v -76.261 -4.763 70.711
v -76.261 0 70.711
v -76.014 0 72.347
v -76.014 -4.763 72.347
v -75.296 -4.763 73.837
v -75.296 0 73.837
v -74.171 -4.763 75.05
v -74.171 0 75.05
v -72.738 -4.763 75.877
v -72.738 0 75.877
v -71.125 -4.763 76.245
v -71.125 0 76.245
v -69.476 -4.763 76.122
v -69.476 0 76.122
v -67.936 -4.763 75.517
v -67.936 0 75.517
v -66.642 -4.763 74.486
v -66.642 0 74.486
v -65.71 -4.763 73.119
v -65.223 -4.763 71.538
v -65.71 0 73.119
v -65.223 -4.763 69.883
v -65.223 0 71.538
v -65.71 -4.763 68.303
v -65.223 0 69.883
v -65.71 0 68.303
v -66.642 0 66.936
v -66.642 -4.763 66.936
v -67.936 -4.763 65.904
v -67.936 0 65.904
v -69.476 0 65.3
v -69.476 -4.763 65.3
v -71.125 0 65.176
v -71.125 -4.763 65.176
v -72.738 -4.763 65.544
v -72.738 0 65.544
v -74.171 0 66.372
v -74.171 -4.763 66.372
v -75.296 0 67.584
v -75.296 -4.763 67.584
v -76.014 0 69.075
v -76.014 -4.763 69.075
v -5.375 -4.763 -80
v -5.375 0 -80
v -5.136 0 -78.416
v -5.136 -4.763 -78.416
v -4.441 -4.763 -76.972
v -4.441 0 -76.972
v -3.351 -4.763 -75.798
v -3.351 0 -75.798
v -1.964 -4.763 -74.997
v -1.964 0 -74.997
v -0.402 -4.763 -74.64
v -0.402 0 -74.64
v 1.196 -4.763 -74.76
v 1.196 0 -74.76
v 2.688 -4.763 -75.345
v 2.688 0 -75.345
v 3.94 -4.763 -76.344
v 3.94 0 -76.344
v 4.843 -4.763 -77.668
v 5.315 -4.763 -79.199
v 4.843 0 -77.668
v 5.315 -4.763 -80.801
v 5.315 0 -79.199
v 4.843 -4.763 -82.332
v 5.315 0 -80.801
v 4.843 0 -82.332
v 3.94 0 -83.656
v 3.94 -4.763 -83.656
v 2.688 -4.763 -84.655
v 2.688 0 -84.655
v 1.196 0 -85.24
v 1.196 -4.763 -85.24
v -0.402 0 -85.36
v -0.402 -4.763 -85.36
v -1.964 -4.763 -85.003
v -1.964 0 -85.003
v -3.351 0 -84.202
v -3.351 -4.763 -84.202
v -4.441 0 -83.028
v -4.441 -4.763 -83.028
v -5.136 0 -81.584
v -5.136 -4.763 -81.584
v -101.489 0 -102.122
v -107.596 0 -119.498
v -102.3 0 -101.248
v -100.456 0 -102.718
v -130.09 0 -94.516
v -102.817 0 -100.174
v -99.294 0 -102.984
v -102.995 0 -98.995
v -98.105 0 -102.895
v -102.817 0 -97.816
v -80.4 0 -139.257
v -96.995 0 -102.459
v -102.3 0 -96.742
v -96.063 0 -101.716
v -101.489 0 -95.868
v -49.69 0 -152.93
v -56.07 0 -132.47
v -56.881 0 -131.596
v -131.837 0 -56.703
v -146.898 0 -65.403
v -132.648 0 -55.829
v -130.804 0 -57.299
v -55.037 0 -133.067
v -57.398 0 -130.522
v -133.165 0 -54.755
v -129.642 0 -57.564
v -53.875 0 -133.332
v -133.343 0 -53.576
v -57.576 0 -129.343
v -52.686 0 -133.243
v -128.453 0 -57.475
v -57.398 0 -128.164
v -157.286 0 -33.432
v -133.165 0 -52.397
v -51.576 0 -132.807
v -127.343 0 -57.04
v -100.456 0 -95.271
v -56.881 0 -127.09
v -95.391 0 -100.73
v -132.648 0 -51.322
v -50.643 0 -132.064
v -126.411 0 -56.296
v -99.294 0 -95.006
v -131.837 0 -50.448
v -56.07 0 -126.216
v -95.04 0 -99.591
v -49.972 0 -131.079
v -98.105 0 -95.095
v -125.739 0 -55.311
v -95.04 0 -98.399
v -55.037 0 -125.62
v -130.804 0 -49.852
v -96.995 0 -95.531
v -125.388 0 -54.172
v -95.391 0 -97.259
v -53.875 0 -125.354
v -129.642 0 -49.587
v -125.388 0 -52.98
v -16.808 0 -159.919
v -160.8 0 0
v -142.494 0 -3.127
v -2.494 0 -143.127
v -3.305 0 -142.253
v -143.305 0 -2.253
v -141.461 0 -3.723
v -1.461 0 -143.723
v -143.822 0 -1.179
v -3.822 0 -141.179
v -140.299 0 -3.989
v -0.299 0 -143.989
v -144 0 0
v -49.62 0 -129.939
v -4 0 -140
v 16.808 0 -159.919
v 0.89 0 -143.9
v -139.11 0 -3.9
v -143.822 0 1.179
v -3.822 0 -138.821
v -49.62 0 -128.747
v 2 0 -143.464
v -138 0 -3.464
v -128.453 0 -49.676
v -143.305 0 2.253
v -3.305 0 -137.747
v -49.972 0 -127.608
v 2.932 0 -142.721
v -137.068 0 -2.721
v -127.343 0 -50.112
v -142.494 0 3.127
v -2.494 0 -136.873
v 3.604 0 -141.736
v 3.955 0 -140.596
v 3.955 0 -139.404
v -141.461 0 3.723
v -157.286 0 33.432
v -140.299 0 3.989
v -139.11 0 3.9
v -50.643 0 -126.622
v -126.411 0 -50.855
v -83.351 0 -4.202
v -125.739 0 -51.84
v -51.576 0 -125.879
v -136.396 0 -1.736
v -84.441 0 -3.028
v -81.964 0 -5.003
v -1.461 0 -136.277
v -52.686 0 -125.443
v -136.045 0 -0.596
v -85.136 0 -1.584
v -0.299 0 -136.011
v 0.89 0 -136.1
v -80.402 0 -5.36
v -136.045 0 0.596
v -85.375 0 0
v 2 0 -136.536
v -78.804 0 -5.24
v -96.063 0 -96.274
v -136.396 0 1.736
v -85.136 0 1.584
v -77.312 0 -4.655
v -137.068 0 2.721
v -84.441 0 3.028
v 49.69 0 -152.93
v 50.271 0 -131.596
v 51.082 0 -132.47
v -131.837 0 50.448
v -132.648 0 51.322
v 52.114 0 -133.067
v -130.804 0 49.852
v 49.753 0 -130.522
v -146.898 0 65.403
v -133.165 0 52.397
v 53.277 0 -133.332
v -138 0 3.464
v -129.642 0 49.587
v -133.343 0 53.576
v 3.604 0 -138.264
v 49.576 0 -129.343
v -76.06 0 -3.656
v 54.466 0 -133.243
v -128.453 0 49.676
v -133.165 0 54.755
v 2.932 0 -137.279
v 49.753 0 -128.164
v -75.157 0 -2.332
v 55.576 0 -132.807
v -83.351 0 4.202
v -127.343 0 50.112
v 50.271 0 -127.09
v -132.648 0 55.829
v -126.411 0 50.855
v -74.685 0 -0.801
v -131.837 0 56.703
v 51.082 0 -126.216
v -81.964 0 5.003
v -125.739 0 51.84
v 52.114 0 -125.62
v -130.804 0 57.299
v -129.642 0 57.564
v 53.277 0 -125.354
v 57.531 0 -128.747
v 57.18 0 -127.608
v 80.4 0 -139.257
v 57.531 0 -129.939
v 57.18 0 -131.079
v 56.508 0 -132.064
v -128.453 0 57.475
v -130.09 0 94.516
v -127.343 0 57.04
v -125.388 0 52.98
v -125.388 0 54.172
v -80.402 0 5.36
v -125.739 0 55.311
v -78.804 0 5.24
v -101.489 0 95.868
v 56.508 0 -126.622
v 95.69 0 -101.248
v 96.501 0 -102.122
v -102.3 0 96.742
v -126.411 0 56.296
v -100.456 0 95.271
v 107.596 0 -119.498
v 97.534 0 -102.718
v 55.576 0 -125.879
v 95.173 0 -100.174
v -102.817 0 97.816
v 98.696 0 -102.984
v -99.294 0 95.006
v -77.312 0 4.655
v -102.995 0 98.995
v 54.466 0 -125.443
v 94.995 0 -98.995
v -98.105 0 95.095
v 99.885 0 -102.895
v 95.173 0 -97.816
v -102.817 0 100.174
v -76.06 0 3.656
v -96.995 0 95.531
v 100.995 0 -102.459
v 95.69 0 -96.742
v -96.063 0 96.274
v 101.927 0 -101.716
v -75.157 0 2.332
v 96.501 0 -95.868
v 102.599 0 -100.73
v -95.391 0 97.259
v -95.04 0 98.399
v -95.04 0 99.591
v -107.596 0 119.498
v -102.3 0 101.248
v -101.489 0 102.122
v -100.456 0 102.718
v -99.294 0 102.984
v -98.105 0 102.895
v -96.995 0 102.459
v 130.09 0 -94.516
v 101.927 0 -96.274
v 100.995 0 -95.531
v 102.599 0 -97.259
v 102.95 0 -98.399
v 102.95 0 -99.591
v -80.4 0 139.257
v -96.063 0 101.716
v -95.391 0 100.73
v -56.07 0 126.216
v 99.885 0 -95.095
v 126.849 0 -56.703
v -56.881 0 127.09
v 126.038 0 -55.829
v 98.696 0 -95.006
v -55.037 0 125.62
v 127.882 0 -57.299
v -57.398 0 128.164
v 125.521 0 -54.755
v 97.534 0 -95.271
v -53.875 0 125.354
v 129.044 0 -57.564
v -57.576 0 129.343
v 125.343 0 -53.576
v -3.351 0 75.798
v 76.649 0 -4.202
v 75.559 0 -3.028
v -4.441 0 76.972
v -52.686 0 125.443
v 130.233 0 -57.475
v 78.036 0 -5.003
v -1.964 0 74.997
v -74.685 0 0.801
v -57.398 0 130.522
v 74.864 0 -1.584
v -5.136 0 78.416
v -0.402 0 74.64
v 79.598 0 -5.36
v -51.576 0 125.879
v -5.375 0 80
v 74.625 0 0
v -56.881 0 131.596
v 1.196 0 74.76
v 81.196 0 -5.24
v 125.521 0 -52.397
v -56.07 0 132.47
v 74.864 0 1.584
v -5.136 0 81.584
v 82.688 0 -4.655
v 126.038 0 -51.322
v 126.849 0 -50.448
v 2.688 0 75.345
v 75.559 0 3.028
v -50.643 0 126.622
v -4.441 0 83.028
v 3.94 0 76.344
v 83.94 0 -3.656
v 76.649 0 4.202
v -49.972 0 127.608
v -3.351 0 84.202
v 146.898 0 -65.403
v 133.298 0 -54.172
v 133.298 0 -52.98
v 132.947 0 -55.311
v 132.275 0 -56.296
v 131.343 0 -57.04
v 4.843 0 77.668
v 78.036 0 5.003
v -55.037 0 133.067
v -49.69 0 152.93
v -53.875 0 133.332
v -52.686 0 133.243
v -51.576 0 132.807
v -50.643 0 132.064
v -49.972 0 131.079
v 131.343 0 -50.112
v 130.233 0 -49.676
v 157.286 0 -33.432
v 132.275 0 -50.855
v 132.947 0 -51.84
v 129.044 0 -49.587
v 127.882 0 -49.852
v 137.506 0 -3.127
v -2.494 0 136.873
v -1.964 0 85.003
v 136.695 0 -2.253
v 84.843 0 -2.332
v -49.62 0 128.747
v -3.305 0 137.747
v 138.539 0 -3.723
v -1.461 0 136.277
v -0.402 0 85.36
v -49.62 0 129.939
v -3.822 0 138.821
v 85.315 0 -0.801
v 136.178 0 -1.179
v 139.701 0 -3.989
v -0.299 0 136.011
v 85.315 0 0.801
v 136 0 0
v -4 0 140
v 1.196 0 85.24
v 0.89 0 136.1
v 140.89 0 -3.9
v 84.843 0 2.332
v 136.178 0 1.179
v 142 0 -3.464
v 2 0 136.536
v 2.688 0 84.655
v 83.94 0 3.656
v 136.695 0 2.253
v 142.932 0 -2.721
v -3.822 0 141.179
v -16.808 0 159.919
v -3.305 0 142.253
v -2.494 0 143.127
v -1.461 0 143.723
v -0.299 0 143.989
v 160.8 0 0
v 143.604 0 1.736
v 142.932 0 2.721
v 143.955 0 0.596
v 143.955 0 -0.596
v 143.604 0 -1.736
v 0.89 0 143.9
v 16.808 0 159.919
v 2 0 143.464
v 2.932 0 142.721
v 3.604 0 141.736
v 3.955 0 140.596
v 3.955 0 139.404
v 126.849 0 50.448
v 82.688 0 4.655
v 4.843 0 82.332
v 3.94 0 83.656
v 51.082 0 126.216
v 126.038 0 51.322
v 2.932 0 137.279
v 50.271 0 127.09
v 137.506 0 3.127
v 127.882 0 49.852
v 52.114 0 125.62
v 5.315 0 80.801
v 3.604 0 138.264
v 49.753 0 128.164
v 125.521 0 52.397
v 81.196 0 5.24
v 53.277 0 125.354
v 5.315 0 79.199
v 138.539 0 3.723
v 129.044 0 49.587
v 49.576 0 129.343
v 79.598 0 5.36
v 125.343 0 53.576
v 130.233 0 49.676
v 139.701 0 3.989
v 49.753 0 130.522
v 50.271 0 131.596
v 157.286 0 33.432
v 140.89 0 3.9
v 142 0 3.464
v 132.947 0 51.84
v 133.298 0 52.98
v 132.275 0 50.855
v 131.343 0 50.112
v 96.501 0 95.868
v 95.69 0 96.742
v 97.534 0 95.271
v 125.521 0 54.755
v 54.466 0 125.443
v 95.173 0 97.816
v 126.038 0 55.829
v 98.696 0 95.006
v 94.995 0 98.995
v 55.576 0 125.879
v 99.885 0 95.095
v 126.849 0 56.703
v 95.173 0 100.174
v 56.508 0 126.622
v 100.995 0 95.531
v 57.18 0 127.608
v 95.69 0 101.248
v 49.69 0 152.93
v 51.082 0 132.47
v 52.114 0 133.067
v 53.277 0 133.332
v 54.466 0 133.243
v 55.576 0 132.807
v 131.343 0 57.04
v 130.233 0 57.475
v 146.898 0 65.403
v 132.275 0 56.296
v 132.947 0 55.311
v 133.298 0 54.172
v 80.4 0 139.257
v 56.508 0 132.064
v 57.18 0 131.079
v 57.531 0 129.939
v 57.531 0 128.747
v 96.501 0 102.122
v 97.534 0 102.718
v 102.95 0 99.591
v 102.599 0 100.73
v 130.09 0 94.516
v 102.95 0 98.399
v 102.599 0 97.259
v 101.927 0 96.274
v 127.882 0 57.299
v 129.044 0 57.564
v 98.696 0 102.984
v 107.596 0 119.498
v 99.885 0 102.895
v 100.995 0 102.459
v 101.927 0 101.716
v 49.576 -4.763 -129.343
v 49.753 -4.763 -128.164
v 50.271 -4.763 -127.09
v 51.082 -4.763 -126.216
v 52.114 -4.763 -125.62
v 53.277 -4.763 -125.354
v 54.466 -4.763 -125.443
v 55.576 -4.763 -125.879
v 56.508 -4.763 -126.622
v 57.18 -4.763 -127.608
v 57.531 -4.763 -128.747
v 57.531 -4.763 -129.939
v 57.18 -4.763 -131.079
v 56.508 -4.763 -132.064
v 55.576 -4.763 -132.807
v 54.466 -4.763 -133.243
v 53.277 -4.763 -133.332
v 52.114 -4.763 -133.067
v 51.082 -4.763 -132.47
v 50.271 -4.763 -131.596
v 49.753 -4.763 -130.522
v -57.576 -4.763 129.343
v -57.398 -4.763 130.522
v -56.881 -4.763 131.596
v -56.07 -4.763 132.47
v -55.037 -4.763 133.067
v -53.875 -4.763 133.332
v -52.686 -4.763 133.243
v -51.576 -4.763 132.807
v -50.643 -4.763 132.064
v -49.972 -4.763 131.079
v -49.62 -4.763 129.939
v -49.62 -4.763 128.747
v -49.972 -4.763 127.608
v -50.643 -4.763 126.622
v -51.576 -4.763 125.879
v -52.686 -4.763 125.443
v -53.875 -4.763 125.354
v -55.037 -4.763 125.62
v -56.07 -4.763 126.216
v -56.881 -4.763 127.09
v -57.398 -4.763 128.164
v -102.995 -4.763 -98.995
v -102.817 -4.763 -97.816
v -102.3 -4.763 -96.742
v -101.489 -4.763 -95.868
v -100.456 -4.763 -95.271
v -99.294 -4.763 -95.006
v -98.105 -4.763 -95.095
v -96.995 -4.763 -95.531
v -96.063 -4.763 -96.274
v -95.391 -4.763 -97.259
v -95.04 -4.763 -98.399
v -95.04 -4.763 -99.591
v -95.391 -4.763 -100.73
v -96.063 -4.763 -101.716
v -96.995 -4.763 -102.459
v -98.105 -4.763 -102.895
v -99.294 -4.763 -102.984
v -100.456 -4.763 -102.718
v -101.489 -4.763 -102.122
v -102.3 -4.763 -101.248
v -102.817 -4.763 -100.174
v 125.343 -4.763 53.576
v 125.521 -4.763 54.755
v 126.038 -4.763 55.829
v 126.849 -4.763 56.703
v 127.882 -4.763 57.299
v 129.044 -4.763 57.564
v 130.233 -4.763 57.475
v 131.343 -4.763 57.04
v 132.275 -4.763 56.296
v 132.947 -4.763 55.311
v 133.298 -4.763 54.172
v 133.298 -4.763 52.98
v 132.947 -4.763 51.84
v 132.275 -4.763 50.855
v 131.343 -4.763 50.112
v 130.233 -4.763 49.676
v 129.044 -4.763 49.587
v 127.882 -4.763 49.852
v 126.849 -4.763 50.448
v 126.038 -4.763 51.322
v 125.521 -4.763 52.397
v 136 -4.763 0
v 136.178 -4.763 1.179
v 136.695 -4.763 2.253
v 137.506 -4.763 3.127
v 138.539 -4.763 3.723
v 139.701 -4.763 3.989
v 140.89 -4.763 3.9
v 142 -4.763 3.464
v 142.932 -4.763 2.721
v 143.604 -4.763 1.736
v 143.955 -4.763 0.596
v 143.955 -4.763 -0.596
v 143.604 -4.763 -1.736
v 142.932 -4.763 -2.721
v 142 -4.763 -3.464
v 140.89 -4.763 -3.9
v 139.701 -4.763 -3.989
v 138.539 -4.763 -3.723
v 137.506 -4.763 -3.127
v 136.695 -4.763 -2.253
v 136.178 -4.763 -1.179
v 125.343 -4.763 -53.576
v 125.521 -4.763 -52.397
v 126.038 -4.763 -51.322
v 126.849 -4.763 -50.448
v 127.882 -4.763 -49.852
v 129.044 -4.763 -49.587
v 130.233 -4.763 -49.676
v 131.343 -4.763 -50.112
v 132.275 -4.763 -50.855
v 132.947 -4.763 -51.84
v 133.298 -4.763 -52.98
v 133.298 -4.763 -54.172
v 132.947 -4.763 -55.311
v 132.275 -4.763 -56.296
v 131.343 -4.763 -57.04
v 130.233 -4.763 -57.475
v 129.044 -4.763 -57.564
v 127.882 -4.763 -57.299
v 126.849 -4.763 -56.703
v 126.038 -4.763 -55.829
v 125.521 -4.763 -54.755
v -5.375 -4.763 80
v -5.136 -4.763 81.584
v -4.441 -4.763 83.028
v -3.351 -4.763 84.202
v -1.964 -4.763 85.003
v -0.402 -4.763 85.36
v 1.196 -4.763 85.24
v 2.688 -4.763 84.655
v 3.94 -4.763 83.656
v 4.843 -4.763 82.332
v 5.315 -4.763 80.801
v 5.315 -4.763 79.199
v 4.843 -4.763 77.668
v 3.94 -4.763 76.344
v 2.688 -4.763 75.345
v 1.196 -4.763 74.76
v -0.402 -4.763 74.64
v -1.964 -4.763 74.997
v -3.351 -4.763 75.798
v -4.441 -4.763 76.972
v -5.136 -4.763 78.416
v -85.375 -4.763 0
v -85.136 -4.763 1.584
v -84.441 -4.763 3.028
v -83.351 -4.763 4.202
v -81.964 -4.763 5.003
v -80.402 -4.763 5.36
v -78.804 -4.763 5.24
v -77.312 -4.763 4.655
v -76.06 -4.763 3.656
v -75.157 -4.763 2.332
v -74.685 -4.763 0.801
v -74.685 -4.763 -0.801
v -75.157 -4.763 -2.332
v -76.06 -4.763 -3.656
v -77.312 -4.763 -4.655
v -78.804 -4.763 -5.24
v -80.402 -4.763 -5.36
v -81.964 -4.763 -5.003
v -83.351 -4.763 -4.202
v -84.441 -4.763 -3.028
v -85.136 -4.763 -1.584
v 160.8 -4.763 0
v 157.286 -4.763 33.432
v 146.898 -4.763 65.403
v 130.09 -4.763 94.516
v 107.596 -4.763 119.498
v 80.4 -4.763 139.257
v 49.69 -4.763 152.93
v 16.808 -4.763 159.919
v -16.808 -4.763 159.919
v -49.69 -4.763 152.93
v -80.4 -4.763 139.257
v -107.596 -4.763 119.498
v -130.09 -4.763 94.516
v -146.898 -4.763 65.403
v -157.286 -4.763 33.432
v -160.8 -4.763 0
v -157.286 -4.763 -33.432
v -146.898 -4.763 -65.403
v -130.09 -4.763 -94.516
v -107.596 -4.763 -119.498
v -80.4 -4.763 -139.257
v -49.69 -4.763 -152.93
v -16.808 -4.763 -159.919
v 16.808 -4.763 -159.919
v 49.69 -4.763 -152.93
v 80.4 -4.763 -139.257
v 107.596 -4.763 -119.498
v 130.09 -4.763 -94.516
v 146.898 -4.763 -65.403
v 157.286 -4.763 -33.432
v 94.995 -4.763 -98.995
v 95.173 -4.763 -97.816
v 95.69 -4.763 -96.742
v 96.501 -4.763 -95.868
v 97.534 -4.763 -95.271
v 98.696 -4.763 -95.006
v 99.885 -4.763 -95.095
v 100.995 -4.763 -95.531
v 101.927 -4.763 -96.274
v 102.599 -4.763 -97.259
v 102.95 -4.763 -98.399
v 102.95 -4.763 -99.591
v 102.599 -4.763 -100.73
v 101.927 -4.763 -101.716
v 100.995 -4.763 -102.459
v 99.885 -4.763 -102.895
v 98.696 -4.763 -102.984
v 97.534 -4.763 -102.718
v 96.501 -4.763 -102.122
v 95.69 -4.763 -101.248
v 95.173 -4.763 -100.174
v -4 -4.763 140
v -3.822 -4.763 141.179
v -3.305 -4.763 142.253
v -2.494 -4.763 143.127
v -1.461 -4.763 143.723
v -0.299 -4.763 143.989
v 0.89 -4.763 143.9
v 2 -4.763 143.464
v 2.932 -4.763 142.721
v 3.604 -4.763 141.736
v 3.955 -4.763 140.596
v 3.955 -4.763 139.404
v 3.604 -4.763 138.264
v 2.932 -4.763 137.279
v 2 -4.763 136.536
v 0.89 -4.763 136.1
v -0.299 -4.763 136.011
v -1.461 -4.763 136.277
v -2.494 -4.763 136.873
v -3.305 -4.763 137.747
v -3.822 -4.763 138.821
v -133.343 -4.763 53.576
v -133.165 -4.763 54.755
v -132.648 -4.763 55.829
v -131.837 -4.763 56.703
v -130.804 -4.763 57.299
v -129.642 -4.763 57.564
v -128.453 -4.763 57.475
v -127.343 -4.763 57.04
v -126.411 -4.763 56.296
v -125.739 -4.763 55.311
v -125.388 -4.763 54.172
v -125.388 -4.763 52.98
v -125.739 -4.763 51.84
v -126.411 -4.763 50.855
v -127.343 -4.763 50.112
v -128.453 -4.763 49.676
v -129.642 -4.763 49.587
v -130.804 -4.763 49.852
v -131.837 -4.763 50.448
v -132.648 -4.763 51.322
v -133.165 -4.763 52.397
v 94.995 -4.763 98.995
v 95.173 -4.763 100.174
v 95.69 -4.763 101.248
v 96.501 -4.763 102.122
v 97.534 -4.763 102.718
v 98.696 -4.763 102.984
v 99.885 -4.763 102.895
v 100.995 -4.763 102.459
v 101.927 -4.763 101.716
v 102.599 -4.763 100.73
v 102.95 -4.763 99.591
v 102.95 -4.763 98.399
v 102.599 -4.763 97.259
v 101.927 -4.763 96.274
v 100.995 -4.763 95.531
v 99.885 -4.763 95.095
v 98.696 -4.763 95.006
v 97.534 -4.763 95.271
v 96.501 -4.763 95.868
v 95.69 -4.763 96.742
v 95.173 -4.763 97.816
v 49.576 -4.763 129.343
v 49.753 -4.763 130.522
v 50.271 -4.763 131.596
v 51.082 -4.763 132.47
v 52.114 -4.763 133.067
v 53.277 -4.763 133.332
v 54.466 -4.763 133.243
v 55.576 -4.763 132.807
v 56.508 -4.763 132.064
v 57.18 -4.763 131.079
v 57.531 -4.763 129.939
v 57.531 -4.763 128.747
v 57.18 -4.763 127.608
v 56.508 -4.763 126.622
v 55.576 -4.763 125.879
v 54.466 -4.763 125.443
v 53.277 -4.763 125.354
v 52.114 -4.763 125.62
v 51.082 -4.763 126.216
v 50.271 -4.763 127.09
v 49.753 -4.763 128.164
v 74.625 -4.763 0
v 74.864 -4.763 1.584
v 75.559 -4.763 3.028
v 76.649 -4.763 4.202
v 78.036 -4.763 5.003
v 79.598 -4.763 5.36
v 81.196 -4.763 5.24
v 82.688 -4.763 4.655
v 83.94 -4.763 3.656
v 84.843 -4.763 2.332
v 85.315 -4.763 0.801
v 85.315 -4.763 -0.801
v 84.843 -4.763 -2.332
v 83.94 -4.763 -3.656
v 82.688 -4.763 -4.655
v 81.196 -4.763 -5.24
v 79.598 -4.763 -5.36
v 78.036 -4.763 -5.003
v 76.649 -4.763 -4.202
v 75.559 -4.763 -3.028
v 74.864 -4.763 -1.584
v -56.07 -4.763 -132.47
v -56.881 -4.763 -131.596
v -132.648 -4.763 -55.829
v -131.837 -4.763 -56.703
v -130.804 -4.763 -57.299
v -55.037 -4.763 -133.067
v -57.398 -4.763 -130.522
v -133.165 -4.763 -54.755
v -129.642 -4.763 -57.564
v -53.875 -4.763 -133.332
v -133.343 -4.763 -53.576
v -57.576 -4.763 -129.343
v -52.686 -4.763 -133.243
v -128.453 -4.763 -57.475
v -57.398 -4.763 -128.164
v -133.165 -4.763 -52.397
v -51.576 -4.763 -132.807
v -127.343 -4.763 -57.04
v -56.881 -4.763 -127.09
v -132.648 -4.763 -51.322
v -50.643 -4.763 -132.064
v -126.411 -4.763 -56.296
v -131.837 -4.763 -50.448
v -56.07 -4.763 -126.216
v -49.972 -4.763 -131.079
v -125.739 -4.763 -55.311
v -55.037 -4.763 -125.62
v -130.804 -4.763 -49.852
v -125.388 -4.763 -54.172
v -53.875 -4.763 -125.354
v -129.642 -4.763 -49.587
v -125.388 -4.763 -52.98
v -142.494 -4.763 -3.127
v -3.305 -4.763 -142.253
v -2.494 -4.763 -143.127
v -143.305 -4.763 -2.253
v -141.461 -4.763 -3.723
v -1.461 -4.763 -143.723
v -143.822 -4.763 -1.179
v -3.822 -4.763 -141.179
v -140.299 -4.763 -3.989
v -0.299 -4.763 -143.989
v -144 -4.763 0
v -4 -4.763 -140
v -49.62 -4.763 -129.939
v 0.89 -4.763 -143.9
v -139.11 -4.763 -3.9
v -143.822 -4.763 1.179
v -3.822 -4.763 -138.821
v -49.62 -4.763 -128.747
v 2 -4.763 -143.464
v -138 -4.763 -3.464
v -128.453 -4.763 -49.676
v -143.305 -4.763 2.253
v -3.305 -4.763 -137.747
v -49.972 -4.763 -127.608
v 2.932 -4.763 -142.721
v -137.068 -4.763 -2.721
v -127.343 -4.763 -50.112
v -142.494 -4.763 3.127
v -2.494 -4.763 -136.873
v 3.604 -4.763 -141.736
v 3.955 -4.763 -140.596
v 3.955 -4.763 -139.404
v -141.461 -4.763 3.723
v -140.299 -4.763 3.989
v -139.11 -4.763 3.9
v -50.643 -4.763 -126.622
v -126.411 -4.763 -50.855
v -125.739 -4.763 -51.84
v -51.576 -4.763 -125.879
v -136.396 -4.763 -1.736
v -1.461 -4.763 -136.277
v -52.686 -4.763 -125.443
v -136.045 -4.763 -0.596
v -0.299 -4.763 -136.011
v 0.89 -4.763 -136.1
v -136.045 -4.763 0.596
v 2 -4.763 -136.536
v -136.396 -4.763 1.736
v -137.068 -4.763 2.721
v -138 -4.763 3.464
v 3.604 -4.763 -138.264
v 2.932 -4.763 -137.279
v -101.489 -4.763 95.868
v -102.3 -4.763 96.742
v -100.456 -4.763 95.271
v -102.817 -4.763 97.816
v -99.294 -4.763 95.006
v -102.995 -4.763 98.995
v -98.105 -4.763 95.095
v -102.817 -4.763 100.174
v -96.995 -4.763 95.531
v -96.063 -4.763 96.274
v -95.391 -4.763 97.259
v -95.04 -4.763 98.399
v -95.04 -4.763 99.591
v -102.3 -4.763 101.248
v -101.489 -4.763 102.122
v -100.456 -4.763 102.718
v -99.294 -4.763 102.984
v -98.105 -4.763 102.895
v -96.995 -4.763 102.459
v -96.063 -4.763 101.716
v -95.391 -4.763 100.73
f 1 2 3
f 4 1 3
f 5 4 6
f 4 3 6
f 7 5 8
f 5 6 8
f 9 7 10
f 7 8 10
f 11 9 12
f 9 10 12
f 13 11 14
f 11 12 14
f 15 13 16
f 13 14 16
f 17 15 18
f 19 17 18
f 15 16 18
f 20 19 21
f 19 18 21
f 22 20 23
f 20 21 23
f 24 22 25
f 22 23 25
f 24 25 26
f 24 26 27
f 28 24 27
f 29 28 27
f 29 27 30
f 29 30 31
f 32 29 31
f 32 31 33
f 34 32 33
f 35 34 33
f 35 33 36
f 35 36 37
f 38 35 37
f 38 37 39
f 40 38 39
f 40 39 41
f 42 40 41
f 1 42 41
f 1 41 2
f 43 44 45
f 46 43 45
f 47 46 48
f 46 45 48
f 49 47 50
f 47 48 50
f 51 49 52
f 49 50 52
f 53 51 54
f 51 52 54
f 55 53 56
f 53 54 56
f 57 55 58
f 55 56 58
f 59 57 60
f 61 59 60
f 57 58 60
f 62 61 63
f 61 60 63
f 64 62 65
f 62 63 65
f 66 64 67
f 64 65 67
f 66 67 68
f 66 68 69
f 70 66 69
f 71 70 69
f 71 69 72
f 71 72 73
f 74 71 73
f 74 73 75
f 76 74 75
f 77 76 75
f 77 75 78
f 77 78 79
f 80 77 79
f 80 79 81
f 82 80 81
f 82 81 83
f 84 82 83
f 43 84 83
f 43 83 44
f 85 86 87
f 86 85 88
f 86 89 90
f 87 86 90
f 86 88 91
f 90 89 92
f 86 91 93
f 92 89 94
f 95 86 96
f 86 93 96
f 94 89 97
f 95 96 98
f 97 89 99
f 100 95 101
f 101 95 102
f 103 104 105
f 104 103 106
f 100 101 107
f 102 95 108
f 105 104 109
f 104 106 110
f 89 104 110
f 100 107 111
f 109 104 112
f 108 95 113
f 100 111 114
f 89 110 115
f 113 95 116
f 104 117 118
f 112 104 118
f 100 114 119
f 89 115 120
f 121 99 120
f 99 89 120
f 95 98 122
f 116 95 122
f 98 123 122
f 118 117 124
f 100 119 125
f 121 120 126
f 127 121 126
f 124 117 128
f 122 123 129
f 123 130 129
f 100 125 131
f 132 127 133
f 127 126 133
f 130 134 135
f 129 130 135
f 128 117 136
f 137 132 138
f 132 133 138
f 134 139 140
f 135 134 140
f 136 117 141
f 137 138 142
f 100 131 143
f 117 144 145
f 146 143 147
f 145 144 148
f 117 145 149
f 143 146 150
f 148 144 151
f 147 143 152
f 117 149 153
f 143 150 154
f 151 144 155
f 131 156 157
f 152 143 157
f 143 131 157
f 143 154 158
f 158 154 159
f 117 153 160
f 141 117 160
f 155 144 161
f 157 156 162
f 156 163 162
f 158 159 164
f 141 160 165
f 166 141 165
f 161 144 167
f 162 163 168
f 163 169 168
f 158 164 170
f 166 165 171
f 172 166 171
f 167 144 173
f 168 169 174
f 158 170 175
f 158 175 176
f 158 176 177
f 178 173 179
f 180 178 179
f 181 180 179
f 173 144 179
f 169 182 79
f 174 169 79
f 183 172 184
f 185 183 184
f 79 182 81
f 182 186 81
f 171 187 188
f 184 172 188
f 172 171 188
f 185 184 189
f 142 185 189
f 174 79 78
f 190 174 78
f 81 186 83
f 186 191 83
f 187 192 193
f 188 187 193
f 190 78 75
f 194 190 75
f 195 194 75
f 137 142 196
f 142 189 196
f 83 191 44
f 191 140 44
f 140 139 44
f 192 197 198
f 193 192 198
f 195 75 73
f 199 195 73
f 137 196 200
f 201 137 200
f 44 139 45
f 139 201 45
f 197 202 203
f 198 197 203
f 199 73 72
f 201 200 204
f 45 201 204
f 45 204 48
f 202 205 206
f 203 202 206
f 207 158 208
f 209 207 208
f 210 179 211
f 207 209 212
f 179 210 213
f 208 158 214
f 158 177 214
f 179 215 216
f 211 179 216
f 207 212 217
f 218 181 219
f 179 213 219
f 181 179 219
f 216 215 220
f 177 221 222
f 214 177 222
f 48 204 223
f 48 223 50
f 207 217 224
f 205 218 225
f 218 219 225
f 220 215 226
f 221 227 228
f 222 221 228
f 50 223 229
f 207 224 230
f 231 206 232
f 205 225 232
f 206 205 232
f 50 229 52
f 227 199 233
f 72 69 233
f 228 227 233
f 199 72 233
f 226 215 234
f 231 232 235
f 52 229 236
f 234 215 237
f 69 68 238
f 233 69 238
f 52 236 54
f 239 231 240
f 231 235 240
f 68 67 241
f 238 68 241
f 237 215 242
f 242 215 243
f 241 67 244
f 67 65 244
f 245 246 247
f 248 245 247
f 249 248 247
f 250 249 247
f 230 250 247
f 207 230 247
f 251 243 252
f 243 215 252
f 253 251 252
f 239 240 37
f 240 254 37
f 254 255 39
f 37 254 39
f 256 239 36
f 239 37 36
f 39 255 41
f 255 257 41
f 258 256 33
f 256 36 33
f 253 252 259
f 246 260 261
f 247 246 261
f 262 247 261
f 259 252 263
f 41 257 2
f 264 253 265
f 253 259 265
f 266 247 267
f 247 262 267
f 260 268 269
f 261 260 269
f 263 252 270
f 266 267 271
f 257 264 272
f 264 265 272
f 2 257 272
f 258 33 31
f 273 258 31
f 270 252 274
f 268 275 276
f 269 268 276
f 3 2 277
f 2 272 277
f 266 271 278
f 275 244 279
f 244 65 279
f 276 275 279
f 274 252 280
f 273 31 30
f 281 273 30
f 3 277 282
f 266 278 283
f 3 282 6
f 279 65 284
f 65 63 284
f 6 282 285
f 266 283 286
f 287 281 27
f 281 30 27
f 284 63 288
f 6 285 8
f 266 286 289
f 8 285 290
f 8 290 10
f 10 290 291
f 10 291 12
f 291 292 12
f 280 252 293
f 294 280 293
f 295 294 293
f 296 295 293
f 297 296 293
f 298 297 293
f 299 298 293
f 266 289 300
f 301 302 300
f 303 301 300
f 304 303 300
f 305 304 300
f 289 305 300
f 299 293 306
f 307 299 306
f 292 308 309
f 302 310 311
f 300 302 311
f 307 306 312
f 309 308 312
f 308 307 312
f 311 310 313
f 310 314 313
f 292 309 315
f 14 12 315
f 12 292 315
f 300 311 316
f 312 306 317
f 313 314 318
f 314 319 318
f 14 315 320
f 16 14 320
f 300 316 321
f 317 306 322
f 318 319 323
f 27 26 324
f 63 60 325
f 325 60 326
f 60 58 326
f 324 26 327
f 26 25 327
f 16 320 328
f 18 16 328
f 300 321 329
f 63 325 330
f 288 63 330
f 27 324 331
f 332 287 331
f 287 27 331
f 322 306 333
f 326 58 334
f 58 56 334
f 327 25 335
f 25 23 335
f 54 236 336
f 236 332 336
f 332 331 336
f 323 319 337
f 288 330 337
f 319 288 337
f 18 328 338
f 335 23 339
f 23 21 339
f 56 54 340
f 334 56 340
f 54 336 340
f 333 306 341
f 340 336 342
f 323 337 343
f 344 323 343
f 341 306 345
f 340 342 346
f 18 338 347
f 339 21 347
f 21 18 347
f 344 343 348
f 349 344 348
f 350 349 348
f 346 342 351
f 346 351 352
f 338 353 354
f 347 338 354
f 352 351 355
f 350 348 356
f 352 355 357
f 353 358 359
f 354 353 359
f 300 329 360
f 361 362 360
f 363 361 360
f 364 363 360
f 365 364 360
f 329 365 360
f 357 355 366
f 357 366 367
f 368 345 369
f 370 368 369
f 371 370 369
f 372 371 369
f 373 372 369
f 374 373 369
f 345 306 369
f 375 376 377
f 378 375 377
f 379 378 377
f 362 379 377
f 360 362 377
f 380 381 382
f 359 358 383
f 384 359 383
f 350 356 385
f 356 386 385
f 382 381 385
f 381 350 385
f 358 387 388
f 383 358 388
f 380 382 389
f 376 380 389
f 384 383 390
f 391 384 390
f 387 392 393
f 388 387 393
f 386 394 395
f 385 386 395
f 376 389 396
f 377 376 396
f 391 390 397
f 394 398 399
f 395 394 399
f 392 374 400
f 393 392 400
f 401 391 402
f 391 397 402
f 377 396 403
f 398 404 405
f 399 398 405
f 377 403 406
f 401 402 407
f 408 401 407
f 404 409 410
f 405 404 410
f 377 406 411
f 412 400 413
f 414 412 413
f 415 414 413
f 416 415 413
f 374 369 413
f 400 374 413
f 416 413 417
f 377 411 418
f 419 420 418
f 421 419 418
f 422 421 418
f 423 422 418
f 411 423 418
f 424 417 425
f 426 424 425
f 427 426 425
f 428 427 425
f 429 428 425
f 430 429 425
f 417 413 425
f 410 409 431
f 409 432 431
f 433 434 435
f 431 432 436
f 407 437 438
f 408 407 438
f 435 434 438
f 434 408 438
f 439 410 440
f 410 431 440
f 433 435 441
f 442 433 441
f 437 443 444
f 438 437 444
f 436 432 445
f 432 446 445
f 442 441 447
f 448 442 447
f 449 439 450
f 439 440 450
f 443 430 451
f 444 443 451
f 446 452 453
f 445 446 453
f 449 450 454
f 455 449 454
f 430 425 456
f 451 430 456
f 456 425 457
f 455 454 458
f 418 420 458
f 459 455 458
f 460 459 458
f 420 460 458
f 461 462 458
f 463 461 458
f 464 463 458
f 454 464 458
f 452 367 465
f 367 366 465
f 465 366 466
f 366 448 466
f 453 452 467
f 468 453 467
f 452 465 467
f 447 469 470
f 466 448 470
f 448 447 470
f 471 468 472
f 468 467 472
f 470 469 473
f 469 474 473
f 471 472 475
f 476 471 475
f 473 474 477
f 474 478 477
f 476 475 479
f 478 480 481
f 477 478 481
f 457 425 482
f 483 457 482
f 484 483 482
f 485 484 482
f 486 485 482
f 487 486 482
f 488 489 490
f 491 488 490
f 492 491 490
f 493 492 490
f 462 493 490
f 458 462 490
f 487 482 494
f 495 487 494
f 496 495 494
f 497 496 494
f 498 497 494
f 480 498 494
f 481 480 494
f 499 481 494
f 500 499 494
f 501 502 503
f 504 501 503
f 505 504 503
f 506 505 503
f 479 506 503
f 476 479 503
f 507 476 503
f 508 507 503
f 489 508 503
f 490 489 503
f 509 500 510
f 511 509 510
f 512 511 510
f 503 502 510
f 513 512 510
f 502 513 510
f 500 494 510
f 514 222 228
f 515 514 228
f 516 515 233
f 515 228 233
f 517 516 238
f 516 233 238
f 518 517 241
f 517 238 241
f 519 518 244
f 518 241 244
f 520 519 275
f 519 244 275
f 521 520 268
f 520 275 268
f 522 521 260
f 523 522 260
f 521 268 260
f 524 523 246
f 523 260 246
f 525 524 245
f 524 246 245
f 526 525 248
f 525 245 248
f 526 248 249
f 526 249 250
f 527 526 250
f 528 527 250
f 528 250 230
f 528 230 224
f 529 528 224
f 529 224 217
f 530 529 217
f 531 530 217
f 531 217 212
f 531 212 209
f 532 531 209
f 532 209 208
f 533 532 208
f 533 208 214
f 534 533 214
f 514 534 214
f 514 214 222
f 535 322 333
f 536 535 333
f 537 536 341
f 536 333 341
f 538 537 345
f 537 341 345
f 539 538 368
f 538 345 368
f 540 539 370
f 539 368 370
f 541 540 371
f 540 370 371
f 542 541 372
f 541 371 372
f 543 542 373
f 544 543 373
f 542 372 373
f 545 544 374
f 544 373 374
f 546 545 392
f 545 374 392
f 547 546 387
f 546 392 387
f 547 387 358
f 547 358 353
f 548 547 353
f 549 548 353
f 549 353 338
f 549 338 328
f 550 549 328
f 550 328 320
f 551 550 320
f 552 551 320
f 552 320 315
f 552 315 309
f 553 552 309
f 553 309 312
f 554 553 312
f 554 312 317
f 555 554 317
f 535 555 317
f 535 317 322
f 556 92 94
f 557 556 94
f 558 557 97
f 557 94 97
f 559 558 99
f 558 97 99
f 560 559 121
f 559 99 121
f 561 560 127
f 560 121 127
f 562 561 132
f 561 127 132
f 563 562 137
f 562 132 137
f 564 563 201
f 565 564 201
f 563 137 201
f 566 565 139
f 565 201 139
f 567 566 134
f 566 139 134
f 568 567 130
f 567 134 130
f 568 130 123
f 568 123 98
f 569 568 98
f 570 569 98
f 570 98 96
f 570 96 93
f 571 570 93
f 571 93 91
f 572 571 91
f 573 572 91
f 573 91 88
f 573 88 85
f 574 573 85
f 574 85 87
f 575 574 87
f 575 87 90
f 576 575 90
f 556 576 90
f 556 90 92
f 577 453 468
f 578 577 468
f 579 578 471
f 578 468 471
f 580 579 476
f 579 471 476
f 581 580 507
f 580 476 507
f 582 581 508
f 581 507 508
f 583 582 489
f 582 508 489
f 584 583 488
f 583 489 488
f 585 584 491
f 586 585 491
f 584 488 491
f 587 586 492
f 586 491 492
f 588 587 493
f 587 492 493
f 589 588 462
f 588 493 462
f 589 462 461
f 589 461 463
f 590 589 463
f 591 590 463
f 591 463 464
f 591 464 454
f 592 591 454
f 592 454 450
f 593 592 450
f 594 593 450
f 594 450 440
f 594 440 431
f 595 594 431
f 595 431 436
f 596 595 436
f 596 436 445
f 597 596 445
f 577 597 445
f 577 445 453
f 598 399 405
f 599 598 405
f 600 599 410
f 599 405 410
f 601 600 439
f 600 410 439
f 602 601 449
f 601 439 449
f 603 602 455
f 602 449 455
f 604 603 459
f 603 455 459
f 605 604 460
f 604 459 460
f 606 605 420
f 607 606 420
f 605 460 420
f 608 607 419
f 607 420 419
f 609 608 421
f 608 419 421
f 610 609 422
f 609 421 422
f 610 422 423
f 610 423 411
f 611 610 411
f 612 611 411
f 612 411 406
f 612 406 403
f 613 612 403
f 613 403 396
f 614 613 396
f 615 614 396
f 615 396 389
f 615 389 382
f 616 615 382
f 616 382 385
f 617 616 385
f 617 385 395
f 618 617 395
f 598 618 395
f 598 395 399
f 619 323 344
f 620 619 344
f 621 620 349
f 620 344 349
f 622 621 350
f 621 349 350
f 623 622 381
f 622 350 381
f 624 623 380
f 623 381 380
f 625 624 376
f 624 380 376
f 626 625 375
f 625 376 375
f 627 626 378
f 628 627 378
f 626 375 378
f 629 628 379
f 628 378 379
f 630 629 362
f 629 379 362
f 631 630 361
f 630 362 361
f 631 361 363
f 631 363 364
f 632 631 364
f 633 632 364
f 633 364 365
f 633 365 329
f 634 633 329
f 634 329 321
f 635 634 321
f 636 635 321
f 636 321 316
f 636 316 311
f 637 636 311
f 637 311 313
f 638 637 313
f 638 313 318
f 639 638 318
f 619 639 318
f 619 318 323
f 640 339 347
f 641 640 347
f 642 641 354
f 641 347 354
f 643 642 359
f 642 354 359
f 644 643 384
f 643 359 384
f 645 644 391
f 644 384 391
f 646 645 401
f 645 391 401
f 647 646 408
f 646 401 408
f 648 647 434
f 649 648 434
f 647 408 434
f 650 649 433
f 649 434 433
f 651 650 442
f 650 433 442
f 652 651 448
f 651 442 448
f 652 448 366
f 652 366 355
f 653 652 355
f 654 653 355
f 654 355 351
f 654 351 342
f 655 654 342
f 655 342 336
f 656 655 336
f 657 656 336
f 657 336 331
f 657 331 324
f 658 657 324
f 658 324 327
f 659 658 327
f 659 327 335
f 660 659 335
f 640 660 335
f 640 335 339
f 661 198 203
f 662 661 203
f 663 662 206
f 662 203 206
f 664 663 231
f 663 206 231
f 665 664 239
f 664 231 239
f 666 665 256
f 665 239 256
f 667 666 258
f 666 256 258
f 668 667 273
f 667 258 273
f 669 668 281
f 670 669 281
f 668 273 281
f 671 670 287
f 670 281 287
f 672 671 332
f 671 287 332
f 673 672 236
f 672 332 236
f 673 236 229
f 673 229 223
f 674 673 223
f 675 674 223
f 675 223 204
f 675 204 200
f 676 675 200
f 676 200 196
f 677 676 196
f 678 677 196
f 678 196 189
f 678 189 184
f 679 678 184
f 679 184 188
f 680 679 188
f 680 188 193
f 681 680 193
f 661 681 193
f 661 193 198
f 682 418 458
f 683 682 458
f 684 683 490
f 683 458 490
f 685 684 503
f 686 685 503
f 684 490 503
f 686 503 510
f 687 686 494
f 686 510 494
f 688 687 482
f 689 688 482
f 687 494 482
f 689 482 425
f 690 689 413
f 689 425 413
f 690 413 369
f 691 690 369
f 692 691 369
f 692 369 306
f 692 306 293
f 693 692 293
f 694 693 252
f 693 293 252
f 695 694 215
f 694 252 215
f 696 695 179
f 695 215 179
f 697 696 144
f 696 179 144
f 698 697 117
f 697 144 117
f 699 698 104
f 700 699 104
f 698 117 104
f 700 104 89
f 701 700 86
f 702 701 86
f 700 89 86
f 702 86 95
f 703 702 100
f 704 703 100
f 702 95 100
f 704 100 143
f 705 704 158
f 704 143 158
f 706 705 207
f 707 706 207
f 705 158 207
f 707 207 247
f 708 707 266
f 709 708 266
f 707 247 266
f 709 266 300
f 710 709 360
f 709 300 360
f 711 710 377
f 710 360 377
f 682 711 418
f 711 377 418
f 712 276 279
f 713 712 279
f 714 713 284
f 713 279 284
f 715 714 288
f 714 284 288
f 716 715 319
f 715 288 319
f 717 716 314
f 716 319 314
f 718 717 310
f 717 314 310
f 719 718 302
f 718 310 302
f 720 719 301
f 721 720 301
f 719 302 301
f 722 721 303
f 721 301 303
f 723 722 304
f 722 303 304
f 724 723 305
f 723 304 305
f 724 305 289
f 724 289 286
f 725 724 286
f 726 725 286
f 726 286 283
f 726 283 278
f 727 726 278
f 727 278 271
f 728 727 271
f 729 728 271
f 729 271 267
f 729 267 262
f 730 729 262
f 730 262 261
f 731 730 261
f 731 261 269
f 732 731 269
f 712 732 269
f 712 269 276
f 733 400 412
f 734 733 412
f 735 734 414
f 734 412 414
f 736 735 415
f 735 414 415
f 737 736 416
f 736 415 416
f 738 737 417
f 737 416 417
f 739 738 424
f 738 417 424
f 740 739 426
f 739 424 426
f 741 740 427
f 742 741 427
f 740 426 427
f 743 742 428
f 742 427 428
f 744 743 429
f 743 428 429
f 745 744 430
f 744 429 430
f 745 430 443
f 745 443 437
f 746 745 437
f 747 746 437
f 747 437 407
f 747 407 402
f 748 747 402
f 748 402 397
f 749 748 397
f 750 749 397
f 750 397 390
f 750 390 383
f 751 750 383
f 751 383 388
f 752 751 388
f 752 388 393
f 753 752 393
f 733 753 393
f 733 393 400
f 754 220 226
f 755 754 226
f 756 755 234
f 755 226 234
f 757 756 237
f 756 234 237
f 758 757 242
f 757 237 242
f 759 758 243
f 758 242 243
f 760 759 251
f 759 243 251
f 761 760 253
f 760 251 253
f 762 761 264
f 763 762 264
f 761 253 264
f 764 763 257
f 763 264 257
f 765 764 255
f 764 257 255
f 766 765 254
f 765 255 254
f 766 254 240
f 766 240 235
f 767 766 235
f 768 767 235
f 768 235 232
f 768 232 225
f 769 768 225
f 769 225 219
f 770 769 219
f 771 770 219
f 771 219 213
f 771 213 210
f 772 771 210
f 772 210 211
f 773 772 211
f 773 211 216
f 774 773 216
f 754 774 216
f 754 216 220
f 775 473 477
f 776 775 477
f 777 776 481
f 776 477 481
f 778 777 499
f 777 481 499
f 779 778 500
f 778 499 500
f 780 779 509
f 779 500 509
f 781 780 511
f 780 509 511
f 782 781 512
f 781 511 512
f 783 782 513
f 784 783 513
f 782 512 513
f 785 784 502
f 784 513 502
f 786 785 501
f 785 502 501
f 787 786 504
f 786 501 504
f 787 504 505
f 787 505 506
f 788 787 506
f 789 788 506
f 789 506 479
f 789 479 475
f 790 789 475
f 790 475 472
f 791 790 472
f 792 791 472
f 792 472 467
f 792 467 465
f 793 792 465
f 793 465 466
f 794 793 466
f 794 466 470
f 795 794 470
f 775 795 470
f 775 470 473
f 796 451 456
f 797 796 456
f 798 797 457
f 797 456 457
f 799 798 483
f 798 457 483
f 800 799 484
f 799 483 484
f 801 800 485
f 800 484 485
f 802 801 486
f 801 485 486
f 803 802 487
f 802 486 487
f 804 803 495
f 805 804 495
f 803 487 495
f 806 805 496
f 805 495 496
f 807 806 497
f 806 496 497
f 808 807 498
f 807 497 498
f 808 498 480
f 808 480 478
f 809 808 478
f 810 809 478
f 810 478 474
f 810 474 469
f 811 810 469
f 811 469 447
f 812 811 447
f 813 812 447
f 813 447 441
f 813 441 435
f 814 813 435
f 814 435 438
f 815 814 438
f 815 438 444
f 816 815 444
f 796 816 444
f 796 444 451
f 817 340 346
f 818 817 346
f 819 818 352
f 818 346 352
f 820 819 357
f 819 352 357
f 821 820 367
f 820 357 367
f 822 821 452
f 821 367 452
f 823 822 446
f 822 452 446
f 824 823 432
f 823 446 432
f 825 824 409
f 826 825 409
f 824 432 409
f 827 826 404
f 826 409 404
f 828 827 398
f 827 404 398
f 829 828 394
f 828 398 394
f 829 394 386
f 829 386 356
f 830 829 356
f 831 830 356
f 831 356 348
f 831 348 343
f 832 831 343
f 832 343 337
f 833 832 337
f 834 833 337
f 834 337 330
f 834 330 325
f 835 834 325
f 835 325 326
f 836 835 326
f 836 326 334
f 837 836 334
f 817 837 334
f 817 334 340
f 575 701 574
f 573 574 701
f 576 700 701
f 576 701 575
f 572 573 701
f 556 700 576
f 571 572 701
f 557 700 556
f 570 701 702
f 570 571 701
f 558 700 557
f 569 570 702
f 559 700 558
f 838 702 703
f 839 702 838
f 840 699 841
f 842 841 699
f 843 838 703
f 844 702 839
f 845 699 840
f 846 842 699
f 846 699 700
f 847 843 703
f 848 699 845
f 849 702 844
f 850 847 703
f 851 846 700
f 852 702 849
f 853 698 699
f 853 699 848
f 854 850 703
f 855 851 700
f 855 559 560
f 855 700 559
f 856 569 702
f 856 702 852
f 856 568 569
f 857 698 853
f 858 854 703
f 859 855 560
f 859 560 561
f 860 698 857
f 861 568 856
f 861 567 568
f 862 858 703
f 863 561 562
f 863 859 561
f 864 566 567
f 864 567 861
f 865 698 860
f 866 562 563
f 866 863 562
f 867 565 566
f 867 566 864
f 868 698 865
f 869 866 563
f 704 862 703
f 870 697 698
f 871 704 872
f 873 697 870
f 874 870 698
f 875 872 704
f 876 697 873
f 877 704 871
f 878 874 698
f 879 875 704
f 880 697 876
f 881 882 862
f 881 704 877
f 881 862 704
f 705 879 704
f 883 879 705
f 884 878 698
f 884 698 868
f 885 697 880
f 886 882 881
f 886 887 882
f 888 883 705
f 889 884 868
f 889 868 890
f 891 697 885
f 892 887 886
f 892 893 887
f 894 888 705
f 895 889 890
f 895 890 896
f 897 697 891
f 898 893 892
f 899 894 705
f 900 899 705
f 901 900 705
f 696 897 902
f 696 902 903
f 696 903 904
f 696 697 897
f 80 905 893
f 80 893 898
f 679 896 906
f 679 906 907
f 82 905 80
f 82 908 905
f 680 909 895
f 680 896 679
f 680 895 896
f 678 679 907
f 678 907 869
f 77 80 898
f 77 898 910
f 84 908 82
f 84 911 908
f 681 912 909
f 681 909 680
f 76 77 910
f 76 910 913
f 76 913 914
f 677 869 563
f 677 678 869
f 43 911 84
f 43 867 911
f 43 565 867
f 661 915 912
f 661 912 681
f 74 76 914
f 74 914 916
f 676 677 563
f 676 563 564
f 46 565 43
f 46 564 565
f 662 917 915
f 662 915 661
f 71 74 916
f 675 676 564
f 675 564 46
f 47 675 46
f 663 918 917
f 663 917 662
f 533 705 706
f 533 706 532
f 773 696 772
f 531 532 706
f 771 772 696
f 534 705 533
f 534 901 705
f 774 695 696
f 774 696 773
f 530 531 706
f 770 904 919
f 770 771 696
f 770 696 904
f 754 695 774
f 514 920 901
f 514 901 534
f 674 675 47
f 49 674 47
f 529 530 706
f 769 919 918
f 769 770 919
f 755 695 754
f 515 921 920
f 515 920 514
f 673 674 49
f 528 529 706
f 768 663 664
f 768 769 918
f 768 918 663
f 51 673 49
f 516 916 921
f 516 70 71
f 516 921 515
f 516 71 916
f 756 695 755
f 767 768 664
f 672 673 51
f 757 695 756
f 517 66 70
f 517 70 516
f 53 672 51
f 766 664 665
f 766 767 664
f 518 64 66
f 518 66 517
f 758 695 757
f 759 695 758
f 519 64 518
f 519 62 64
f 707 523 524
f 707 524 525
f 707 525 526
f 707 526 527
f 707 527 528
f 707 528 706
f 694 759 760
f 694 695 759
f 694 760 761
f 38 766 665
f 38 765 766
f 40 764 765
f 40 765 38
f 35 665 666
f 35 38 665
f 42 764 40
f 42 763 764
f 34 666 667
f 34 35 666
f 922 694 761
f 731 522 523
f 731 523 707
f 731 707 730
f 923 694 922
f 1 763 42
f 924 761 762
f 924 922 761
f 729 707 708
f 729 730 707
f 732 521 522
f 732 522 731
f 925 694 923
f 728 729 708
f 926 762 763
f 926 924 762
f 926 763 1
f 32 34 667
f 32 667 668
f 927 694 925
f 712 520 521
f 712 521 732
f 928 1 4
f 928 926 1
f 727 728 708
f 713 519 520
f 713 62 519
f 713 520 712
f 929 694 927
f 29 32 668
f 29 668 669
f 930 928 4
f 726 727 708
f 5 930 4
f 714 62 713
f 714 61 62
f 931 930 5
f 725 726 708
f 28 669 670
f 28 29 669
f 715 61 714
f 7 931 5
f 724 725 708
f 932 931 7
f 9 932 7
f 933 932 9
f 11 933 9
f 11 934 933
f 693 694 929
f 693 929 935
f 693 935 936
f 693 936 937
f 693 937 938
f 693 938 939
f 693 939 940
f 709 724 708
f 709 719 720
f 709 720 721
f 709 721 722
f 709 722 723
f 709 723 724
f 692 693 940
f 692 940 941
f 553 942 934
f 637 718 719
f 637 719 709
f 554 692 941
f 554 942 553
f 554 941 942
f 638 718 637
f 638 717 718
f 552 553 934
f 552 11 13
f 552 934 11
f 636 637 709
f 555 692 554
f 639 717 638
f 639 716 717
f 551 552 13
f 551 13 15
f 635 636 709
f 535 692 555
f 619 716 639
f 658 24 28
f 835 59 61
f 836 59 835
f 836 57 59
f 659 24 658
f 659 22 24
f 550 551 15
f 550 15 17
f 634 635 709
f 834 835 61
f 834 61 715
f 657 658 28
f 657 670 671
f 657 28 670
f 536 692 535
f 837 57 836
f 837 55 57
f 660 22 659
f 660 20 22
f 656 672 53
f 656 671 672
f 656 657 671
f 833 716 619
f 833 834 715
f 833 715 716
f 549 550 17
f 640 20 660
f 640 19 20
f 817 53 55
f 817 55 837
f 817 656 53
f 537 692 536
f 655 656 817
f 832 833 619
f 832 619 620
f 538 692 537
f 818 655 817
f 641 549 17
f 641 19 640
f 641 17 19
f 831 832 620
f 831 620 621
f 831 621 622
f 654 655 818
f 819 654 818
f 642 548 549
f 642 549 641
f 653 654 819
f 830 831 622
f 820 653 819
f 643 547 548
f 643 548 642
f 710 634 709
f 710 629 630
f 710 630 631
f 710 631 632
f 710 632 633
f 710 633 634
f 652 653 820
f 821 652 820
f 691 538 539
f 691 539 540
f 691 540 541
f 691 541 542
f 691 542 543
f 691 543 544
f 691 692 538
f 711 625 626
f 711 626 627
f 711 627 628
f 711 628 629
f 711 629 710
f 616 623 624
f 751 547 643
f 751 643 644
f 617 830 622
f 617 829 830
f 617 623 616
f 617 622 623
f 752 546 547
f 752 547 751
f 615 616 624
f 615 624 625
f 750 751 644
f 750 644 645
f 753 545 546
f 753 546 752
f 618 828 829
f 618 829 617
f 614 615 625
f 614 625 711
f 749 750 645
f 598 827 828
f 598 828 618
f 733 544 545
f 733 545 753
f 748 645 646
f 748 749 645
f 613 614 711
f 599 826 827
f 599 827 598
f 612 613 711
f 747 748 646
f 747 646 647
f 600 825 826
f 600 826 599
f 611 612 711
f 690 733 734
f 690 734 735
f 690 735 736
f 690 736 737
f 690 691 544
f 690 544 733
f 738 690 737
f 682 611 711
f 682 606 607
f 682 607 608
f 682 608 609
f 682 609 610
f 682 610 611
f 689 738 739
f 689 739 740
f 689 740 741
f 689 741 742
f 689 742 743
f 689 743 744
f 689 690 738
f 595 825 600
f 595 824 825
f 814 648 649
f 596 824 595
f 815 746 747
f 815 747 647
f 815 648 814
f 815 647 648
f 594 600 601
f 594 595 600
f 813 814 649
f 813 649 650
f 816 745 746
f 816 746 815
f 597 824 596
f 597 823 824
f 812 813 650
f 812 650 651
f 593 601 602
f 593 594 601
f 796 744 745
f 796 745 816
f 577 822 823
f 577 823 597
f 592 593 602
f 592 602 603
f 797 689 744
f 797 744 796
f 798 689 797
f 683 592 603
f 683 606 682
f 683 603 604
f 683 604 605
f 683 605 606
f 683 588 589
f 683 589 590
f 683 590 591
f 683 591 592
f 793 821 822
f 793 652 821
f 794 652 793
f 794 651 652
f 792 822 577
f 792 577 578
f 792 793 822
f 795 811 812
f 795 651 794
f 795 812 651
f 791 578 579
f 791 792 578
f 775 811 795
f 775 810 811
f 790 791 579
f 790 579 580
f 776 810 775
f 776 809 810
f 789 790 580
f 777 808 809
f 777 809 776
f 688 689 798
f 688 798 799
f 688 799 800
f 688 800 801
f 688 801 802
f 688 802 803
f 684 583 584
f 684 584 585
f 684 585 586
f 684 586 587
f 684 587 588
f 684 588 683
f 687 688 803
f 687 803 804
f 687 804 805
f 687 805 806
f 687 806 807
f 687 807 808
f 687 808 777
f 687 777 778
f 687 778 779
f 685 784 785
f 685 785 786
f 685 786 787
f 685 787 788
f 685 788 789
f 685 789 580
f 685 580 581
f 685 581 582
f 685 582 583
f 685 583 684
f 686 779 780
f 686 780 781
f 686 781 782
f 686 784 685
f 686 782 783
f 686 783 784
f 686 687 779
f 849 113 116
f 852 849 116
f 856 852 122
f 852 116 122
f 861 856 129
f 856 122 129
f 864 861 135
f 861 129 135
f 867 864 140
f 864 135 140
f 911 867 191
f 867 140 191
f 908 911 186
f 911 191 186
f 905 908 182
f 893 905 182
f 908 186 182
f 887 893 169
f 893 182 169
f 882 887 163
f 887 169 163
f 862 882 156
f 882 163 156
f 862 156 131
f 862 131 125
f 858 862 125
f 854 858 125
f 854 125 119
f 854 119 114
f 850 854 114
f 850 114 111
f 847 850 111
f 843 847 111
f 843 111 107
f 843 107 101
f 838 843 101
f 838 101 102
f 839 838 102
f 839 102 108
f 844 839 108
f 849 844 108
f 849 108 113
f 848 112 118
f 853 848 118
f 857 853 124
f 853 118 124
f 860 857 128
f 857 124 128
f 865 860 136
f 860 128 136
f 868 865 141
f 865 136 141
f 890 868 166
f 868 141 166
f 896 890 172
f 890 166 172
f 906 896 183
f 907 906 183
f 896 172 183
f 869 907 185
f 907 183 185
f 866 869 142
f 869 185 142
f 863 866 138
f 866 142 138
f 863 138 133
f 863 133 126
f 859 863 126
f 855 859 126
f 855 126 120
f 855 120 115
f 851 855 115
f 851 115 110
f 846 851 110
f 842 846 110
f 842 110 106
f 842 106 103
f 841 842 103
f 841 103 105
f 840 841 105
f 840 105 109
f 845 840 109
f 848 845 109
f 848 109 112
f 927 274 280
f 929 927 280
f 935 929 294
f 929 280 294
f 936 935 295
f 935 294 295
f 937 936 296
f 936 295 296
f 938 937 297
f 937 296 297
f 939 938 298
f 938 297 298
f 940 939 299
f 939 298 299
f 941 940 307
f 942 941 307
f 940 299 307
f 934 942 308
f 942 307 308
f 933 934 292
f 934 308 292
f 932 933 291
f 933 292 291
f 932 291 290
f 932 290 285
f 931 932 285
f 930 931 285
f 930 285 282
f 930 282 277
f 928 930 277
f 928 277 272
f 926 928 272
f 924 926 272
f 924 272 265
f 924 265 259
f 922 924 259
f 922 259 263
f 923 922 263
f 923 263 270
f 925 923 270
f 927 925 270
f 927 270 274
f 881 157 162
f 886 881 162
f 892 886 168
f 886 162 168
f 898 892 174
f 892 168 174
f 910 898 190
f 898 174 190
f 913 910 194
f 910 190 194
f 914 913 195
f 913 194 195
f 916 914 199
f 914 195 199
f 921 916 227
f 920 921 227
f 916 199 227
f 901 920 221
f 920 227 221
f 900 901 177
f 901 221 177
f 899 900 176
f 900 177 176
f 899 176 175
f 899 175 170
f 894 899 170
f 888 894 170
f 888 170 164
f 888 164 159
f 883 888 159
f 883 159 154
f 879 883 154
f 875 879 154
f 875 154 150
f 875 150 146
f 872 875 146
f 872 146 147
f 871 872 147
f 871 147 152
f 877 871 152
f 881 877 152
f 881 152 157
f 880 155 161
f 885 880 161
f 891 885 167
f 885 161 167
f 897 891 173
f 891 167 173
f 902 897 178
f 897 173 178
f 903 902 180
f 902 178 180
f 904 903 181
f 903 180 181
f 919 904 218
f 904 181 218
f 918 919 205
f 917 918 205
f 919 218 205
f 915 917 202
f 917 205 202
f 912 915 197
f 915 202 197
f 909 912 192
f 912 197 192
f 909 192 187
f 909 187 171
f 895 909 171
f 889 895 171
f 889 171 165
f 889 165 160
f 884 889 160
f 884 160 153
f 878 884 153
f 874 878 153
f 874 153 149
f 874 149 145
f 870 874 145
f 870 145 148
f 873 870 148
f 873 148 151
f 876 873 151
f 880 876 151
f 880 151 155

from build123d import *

# Parameters (mm, degrees)
F0_R     = 160.8
F1_DEPTH = 4.763
F3_D     = 10.75
F5_D     = 8
F7_D     = 11.1


with BuildPart() as f1:
    # F0 (on Front) → F1 (new body)
    with BuildSketch(Plane.XZ):
        Circle(F0_R)
    extrude(amount=F1_DEPTH)

    # F3 (through all)
    with Locations(Plane.XZ.offset(4.763)):
        with Locations((-80, 0), (0, 80), (80, 0), (0, -80)):
            Hole(F3_D / 2)

    # F5 (through all)
    with Locations(Plane.XZ.offset(4.763)):
        with Locations((-53.575681, 129.343135), (0, 140), (53.575681, 129.343135), (98.994949, 98.994949), (129.343135, 53.575681), (140, 0), (129.343135, -53.575681), (98.994949, -98.994949), (53.575681, -129.343135), (0, -140), (-53.575681, -129.343135), (-98.994949, -98.994949), (-129.343135, -53.575681), (-140, 0), (-129.343135, 53.575681), (-98.994949, 98.994949)):
            Hole(F5_D / 2)

    # F7 (through all)
    with Locations(Plane.XZ.offset(4.763)):
        with Locations((-70.710678, 70.710678)):
            Hole(F7_D / 2)


solid = f1.part
